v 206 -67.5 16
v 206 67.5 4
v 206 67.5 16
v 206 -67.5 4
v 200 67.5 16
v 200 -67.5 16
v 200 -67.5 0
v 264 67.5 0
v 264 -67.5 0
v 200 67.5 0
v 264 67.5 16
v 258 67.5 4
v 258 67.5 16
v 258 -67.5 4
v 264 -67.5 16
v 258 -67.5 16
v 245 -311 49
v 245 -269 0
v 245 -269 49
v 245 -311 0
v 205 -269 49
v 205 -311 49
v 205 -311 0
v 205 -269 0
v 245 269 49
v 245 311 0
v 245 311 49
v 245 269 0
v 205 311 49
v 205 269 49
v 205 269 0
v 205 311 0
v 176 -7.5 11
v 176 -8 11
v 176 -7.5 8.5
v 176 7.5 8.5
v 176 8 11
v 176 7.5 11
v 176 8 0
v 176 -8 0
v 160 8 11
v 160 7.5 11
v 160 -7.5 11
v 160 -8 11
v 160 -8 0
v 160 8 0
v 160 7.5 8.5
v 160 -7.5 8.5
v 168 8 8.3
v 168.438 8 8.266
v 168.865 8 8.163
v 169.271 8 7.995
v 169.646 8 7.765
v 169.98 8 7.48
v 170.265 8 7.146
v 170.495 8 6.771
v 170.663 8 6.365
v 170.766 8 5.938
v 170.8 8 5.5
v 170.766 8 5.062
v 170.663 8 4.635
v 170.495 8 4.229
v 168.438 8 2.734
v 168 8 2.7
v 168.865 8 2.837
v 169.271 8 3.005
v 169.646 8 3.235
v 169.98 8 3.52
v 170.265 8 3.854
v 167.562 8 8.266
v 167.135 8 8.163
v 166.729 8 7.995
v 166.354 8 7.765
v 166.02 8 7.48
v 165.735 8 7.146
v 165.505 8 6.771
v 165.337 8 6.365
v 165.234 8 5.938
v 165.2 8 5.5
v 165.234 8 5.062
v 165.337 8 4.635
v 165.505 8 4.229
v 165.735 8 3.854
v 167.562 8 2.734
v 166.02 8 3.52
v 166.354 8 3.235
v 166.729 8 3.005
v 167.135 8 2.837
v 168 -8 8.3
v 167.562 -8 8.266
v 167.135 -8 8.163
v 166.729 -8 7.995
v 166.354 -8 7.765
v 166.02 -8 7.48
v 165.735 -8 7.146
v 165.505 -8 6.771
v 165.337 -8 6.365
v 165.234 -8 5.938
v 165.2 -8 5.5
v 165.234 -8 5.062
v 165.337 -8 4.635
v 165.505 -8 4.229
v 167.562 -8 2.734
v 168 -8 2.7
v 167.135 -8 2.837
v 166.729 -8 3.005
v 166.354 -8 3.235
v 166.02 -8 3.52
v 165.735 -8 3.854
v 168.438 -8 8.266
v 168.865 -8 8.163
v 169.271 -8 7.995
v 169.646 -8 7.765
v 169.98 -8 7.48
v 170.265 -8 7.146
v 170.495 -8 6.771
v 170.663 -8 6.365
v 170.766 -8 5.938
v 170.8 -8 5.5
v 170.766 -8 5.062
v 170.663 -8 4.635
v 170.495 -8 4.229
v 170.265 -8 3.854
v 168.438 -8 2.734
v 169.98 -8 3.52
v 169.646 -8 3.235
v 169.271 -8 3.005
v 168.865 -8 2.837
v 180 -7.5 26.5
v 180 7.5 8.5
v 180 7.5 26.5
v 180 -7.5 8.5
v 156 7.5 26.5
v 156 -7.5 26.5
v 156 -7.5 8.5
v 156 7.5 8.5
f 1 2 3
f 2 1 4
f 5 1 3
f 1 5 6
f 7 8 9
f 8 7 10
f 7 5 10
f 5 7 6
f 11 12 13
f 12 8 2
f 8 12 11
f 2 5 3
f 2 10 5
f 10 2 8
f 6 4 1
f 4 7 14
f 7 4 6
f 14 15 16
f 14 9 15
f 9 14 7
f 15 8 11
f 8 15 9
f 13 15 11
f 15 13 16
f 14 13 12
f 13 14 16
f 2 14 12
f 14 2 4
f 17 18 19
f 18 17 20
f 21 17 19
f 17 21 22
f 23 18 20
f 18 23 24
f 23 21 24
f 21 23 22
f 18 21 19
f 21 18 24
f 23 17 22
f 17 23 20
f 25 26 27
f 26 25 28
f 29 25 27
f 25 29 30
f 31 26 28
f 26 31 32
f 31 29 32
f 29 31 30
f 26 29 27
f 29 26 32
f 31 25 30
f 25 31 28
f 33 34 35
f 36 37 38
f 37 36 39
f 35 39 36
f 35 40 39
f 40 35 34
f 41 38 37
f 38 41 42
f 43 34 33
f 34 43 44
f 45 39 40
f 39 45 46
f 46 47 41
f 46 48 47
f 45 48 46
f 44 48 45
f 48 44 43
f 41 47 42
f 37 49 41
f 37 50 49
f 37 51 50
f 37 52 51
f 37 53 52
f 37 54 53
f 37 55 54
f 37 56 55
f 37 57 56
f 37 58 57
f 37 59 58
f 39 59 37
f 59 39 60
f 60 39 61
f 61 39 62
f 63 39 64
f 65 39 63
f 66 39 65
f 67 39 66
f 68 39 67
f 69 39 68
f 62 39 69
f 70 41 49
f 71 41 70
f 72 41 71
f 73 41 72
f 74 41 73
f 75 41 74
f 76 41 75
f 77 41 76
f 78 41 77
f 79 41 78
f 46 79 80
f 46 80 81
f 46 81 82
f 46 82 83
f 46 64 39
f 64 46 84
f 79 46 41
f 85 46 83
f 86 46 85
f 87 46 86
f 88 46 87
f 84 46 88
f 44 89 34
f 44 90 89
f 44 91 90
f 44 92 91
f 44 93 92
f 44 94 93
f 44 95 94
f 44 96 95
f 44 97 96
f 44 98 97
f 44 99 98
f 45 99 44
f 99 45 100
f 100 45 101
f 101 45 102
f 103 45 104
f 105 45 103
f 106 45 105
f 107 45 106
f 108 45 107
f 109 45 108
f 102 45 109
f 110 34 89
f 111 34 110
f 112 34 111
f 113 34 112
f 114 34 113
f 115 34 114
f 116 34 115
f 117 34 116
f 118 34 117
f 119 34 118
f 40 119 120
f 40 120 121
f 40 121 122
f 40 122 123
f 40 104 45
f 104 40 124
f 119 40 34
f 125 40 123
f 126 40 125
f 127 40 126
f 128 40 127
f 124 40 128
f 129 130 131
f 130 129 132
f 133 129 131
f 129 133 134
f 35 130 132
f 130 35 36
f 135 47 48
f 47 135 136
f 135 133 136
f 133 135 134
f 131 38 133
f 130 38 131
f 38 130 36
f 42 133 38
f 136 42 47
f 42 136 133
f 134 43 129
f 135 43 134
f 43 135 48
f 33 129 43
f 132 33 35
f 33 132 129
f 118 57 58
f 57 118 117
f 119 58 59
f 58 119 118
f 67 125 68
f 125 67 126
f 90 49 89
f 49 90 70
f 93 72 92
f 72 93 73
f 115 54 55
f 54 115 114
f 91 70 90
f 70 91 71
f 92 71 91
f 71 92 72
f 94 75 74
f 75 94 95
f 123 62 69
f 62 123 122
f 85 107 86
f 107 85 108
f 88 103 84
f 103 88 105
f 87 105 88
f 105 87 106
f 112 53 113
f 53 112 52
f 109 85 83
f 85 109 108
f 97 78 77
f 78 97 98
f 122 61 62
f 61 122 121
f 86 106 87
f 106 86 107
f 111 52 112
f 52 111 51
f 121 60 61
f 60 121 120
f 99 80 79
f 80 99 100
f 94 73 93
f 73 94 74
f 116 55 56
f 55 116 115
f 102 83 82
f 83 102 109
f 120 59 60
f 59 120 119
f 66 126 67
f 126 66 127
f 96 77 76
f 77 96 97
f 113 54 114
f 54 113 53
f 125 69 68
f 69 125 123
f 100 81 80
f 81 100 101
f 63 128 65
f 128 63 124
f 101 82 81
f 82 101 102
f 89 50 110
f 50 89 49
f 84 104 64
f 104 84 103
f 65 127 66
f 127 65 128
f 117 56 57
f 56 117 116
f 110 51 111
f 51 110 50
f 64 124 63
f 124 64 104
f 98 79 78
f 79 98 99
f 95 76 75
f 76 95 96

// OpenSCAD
// Mounting accessories for the stock Molex USB-C pair, in millimetres.
// The plug and receptacle are purchased components and are not printed.
part = "preview"; // preview, stand, guide, collar

module block(pos, size) {
    translate(pos) cube(size, center=true);
}

module stand() {
    block([0, 0, 24.5], [40, 42, 49]);
}

module guide() {
    block([0, 0, 2], [55, 135, 4]);
    for (s = [-1, 1]) block([s*29, 0, 8], [6, 135, 16]);
}

module collar() {
    difference() {
        union() {
            block([0, 0, 0], [16, 16, 11]);
            block([0, 0, 12], [24, 15, 18]);
        }
        rotate([90, 0, 0]) cylinder(d=5.6, h=18, center=true, $fn=40);
    }
}

if (part == "preview") {
    translate([232, 0, 0]) guide();
    for (s = [-1, 1]) translate([225, s*290, 0]) stand();
    translate([168, 0, 5.5]) color("goldenrod") collar();
} else if (part == "stand") stand();
else if (part == "guide") guide();
else if (part == "collar") collar();
